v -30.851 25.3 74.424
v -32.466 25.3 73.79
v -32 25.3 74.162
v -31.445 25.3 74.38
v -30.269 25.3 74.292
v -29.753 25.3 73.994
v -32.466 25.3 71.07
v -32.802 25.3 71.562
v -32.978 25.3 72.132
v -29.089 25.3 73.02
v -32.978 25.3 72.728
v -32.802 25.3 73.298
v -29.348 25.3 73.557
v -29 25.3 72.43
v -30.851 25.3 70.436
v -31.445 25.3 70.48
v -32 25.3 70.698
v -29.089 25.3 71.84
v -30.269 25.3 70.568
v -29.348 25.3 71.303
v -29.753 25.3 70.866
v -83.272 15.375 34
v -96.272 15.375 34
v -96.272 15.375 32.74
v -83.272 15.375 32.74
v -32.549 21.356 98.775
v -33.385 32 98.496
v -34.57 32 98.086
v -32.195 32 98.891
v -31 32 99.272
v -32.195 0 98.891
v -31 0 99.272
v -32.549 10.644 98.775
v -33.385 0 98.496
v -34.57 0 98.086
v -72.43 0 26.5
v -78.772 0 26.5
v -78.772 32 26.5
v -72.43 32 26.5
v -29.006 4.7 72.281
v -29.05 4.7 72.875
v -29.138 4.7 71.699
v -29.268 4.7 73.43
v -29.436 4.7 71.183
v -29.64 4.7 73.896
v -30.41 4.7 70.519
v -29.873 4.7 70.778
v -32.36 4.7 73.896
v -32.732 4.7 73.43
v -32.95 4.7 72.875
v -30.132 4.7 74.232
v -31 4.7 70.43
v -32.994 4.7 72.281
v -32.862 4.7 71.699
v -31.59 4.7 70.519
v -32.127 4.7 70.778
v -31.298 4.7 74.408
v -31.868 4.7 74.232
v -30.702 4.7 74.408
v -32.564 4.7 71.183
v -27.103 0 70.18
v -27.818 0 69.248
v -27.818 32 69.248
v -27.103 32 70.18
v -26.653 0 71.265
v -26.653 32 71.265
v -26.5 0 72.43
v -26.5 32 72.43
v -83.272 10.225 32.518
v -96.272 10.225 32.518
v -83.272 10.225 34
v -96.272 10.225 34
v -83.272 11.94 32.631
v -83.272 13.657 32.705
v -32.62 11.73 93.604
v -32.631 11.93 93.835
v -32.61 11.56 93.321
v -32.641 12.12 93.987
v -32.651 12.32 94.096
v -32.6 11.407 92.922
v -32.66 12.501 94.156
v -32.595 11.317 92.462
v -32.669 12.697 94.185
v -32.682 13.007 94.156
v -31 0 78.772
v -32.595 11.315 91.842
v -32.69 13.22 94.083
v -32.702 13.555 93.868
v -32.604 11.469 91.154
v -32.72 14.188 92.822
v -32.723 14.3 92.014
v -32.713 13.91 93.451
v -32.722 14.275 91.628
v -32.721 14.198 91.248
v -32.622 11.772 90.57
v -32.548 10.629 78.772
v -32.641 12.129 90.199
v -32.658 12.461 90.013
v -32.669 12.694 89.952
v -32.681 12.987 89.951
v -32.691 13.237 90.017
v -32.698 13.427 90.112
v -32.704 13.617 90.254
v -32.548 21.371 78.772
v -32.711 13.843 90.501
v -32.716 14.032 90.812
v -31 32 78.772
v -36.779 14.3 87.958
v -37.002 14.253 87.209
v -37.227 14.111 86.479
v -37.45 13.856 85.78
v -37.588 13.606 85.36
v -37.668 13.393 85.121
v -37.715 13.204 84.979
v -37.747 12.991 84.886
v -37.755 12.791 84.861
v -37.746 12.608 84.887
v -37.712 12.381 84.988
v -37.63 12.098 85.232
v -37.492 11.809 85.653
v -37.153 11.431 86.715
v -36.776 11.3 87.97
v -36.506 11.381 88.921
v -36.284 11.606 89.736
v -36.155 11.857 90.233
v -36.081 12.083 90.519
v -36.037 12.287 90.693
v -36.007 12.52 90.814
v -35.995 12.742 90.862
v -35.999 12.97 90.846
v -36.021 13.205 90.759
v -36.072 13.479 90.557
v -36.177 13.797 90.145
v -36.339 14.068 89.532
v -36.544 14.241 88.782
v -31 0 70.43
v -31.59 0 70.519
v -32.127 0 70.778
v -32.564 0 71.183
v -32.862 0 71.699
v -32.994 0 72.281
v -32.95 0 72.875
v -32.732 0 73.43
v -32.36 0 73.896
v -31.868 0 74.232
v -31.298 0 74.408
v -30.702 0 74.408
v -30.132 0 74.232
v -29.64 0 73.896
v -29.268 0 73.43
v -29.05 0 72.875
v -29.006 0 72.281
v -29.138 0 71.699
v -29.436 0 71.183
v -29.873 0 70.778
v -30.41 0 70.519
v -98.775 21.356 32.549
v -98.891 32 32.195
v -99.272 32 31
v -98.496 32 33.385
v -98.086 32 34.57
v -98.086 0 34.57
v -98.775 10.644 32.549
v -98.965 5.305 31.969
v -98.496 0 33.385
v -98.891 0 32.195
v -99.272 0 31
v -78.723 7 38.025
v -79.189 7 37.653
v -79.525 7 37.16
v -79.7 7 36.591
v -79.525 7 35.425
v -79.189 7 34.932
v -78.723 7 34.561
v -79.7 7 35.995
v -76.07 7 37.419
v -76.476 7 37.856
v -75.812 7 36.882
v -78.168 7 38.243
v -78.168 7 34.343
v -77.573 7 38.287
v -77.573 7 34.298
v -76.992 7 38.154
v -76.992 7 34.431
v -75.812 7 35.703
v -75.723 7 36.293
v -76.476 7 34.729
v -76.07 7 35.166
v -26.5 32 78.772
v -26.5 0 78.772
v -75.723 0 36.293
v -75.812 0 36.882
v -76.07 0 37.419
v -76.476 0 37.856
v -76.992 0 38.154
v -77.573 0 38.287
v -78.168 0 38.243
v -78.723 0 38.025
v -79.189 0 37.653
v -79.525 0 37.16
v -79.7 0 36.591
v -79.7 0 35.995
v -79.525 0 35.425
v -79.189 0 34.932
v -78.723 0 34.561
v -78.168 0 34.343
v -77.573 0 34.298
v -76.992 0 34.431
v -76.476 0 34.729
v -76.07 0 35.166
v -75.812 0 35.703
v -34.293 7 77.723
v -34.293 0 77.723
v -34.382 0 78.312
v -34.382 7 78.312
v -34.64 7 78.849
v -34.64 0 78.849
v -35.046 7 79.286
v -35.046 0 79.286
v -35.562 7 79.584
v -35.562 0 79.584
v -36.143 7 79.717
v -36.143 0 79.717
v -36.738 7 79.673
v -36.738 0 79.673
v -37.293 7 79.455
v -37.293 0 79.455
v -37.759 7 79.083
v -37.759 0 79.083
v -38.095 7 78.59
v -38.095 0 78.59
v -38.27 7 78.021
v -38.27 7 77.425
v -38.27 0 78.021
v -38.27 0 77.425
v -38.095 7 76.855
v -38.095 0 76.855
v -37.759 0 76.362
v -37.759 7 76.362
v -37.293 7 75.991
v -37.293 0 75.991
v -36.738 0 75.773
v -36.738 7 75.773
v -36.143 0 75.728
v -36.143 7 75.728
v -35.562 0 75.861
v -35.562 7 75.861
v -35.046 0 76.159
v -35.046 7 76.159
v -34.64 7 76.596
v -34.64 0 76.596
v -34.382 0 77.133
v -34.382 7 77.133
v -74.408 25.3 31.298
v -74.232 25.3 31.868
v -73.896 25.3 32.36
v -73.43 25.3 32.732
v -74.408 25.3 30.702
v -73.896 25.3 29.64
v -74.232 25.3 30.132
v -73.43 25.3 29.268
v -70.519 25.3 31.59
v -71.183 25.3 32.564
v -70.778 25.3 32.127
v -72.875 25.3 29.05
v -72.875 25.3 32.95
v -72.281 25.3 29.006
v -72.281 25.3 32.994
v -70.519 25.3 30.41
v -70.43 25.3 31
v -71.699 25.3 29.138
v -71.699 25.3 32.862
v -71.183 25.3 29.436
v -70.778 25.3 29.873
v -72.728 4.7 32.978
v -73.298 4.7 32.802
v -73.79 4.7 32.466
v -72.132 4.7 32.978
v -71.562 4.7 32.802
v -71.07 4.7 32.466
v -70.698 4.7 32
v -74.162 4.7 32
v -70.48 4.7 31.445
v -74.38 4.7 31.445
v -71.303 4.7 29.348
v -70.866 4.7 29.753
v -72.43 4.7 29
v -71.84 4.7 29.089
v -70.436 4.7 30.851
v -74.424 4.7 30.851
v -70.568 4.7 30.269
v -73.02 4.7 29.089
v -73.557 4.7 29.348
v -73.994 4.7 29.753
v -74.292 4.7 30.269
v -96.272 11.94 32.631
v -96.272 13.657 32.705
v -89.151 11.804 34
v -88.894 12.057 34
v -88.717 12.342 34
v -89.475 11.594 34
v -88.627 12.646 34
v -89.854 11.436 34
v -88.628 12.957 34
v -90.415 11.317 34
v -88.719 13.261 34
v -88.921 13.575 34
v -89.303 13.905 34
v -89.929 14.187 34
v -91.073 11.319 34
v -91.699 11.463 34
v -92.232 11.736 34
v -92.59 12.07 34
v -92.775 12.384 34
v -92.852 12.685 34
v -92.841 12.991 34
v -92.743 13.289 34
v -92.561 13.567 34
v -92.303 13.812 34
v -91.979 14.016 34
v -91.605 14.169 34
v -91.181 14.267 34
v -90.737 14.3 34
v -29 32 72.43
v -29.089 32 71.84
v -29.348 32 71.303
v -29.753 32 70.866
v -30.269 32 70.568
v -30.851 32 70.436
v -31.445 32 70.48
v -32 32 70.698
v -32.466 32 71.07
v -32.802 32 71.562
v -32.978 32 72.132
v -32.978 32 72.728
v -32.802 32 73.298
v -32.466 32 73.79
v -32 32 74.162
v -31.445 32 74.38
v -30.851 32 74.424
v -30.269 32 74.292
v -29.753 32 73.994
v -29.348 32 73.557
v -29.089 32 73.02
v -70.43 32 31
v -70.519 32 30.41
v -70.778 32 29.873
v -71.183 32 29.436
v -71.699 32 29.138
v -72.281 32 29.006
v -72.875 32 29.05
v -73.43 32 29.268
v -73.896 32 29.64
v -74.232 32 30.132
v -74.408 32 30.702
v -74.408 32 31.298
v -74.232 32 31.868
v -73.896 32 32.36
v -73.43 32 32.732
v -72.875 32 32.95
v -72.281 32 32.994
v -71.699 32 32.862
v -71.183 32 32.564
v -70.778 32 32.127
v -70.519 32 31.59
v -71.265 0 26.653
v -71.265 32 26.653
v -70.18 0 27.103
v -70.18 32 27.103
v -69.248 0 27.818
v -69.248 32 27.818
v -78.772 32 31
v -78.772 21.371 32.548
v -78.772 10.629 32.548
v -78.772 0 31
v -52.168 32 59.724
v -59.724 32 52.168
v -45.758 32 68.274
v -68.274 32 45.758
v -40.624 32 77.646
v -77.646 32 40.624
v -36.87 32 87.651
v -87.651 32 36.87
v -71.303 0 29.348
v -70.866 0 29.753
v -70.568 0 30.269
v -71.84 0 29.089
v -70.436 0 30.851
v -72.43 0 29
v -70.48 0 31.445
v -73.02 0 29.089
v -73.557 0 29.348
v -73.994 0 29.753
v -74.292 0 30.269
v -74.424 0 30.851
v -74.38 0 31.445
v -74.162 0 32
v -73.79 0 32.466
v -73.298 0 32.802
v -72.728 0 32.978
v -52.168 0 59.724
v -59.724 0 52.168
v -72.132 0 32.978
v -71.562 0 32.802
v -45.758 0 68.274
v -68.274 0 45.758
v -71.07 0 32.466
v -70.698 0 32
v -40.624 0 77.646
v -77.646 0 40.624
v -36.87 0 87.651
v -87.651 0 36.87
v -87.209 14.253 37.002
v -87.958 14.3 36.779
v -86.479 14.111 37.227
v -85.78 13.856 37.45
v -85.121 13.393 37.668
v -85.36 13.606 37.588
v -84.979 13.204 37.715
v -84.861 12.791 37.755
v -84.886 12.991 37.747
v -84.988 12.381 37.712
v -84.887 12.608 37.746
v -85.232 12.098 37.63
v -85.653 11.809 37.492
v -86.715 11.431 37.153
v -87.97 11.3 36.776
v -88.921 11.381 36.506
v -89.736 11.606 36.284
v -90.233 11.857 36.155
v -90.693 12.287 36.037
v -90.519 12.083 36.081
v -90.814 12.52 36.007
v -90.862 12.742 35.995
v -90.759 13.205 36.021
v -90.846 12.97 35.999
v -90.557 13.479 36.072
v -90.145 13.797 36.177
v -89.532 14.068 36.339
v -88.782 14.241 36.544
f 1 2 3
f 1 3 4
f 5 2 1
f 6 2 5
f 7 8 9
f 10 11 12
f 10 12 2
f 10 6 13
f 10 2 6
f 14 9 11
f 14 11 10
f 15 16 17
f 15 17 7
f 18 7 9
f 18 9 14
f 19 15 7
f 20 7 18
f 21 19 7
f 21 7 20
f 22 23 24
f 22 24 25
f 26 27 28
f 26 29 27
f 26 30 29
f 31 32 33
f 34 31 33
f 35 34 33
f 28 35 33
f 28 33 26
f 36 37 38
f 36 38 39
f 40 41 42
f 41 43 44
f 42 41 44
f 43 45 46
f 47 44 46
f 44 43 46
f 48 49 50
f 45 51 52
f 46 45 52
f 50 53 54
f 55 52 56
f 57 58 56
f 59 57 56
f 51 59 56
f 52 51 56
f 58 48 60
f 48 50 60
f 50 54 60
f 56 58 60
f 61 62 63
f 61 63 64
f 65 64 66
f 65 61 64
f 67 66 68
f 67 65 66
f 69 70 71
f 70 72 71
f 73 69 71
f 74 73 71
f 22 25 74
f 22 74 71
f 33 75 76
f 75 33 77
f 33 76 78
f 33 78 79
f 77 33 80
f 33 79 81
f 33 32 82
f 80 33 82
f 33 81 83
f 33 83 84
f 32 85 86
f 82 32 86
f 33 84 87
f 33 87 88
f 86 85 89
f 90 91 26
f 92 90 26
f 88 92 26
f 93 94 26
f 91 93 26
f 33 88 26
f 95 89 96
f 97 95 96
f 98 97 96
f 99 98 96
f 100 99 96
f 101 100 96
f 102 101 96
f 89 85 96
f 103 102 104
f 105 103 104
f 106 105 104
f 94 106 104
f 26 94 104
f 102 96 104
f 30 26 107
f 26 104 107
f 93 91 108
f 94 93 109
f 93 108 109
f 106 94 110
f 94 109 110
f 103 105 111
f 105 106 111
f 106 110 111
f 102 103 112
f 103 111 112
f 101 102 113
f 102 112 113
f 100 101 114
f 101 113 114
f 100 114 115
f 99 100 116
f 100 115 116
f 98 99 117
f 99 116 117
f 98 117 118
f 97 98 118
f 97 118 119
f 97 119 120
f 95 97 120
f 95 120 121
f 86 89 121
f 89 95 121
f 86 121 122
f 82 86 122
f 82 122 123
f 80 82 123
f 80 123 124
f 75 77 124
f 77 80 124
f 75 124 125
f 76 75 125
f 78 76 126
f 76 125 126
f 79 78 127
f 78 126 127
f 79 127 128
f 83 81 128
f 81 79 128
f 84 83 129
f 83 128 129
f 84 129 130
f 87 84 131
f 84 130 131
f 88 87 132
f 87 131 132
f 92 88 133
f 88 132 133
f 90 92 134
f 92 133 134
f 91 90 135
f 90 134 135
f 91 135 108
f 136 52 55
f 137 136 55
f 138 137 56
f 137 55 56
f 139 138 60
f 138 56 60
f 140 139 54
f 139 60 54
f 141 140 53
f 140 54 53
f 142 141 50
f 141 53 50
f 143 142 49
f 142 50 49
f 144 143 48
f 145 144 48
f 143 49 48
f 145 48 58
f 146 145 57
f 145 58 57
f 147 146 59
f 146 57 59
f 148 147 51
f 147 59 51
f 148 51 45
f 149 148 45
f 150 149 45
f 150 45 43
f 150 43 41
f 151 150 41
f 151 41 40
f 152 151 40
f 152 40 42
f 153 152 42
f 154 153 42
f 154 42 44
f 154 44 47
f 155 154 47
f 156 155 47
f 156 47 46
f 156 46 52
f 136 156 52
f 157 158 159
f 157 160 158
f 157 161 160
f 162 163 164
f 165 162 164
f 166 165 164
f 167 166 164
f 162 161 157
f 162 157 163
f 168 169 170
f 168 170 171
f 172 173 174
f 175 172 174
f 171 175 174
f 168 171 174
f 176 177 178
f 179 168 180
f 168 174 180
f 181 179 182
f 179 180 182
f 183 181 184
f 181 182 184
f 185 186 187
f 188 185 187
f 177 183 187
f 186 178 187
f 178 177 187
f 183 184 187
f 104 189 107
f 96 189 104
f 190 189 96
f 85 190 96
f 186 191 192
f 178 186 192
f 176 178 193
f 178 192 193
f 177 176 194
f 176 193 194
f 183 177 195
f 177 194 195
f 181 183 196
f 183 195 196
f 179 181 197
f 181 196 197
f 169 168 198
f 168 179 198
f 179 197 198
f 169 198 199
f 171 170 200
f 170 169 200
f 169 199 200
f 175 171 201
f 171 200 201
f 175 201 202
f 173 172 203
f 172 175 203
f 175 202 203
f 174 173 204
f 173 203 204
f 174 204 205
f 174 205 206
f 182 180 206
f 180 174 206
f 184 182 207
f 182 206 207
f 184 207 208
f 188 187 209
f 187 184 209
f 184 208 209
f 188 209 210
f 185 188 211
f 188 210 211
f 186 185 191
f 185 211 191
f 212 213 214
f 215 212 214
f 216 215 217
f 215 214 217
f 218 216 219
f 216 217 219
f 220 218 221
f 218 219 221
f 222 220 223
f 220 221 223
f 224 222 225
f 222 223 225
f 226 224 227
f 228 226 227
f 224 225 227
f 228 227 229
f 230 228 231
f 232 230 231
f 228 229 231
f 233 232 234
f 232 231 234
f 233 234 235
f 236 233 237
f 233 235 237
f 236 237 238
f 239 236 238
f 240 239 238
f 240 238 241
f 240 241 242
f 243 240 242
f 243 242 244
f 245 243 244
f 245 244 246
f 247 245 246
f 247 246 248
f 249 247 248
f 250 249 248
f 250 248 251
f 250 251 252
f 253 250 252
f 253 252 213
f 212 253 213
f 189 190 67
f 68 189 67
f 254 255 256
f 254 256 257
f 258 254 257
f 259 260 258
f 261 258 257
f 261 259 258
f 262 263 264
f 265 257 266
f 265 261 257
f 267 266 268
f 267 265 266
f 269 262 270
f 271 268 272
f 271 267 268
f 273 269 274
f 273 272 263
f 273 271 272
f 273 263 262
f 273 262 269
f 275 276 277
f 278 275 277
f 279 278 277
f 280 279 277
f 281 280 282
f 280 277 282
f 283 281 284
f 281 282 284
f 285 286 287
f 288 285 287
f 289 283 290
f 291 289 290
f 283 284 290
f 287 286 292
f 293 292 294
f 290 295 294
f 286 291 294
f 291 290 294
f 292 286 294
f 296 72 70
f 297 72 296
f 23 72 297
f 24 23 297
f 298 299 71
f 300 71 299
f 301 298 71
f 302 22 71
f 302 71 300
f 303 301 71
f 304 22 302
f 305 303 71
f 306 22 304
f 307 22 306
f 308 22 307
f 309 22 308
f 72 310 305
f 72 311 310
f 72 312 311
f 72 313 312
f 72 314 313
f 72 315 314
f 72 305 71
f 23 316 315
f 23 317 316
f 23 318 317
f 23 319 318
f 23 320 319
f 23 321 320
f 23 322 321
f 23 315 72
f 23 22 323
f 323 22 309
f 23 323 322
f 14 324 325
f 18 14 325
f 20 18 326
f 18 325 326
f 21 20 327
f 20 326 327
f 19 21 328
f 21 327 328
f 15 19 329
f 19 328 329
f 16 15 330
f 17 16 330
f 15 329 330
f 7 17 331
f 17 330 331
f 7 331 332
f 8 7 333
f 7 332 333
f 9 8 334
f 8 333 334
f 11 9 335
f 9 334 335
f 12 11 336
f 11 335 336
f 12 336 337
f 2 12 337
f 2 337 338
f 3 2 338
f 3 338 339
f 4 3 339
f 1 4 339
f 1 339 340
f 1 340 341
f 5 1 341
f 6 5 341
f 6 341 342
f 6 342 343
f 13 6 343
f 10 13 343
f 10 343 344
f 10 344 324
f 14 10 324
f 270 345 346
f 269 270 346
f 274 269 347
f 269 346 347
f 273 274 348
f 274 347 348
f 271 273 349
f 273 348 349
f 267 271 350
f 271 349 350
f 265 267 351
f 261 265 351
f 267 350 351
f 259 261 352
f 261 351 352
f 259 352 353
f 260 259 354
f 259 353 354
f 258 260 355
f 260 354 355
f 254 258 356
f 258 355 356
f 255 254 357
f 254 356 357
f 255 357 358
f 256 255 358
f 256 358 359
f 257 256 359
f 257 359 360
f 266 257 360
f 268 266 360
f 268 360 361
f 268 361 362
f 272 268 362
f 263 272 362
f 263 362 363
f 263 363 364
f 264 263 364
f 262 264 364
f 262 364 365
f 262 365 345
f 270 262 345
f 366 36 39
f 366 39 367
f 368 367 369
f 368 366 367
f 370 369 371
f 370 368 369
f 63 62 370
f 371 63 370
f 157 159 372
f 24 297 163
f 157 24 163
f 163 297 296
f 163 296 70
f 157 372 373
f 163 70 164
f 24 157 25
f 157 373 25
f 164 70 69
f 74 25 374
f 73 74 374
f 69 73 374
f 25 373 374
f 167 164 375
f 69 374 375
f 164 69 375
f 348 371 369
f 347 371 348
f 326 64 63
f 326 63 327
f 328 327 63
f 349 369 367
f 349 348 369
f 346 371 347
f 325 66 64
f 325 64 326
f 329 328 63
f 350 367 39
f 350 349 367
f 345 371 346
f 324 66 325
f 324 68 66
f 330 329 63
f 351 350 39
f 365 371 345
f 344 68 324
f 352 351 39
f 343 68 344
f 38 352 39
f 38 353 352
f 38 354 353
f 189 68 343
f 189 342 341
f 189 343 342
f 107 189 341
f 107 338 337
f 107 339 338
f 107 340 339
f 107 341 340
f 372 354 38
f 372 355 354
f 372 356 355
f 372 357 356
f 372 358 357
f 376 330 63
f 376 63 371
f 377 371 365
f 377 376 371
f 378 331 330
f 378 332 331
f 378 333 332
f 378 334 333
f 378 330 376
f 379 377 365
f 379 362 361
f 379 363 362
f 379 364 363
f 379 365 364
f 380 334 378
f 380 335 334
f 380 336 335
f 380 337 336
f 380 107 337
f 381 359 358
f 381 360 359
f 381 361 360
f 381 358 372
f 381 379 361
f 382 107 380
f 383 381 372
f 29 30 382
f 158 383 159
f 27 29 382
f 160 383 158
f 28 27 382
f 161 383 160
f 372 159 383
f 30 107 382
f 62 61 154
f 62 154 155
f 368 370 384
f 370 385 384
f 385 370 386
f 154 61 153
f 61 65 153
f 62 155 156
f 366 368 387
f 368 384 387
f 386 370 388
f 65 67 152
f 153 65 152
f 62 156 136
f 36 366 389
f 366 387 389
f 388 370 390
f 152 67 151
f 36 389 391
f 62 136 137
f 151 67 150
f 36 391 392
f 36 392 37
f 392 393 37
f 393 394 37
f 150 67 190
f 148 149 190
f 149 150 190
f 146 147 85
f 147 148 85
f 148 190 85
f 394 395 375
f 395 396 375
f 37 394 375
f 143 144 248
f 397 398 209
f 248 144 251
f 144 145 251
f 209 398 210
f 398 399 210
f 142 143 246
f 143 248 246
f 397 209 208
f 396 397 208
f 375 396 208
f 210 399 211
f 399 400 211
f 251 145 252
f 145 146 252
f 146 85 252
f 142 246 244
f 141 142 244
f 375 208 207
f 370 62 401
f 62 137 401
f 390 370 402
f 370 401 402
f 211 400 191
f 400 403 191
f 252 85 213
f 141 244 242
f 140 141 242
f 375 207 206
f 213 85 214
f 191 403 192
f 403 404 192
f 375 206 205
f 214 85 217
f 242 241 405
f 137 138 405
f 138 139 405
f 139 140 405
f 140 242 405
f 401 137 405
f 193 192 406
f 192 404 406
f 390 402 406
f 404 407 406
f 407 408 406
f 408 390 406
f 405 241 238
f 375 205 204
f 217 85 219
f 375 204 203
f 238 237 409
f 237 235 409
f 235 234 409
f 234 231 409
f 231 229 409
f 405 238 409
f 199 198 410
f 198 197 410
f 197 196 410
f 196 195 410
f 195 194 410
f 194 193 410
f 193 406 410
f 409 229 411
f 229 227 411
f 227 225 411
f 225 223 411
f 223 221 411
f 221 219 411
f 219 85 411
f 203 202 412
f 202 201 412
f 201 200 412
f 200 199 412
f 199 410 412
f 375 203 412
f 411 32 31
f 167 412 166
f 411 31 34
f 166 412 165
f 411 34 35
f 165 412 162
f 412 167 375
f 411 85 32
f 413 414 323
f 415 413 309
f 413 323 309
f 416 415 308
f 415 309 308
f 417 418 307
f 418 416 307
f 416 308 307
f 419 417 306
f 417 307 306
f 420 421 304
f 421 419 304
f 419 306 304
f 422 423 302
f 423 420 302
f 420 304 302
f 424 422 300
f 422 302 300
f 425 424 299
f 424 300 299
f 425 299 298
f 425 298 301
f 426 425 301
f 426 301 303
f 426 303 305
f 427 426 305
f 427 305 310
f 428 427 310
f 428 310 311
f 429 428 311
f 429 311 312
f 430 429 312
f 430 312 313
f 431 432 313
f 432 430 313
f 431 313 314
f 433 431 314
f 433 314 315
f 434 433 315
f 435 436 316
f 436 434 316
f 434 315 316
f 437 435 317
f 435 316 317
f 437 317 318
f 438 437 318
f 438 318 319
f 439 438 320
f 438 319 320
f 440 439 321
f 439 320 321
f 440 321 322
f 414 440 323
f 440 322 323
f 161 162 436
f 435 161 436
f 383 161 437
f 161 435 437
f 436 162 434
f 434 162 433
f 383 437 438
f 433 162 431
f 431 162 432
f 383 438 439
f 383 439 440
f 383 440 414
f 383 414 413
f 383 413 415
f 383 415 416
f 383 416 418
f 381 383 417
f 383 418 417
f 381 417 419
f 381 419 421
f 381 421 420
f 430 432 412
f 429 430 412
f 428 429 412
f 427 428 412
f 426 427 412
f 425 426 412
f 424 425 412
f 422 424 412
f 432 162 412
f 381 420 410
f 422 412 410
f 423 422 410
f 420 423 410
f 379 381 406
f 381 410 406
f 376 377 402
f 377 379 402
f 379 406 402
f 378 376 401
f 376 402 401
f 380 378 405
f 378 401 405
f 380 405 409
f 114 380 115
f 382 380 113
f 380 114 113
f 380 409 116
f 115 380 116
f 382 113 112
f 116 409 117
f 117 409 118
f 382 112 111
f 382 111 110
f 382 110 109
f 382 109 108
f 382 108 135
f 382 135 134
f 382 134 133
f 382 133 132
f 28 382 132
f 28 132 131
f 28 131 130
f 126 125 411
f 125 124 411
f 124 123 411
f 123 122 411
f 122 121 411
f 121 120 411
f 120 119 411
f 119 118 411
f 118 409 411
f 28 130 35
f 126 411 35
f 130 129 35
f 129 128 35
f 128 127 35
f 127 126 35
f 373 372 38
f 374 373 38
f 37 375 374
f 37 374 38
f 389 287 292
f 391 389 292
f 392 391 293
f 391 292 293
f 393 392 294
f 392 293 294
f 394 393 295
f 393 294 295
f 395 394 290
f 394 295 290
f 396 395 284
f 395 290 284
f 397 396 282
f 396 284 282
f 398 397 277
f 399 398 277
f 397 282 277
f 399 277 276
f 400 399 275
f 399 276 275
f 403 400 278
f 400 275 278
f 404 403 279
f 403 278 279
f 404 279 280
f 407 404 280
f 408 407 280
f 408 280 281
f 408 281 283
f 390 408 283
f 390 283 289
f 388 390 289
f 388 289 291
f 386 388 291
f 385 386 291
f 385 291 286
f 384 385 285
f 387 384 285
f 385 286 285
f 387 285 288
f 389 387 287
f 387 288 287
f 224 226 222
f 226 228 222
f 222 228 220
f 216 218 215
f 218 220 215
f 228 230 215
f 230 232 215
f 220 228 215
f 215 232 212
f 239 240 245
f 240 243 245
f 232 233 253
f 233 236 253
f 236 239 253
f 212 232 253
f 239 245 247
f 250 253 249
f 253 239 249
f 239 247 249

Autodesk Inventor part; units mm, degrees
ref_plane "YZ Plane" through (0, 0, 0) normal (1, 0, 0) x (0, 1, 0)
ref_plane "XZ Plane" through (0, 0, 0) normal (0, 1, 0) x (-1, 0, 0)
ref_plane "XY Plane" through (0, 0, 0) normal (0, 0, 1) x (1, 0, 0)
sketch "Эскиз1" plane through (0, 0, 0) normal (0, 1, 0) x (-1, 0, 0)
  circle A0 centre (-44.87, 82.9015) radius 1.5
  line L0 (-31, 99.2724) -> (-31, 78.7724)
  line L1 (-31, 78.7724) -> (31, 78.7724)
  circle A1 centre (-42.22, 16) radius 1.5
  circle A2 centre (-16, 42.22) radius 1.5
  circle A3 centre (16, 42.22) radius 1.5
  circle A4 centre (31, 72.43) radius 1.5
  circle A5 centre (16, 72.43) radius 1.5
  circle A6 centre (-16, 72.43) radius 1.5
  arc A7 (-31, 99.2724) -> (-99.2724, 31) centre (0, 0) ccw
  circle A8 centre (-74.5664, 57.67) radius 1.5
  circle A9 centre (-82.9015, 44.87) radius 1.5
  circle A10 centre (-72.43, -16) radius 1.5
  circle A11 centre (-72.43, 16) radius 1.5
  line L2 (-78.7724, 31) -> (-78.7724, -31)
  line L3 (-99.2724, 31) -> (-78.7724, 31)
  line L4 (31, 78.7724) -> (31, 99.2724)
  arc A12 (34.57, 98.0863) -> (98.0863, 34.57) centre (109.0212, 109.0212) ccw
  circle A13 centre (72.43, 31) radius 1.5
  line L5 (99.2724, 31) -> (78.7724, 31)
  circle A14 centre (72.43, 16) radius 1.5
  arc A15 (34.57, 98.0863) -> (31, 99.2724) centre (0, 0) ccw
  arc A16 (99.2724, 31) -> (98.0863, 34.57) centre (0, 0) ccw
  arc A17 (98.0863, 34.57) -> (34.57, 98.0863) centre (0, 0) ccw
  circle A18 centre (42.22, 16) radius 1.5
  circle A19 centre (82.9015, -44.87) radius 1.5
  line L6 (78.7724, -31) -> (99.2724, -31)
  arc A20 (31, -99.2724) -> (99.2724, -31) centre (0, 0) ccw
  circle A21 centre (16, -72.43) radius 1.5
  line L7 (31, -78.7724) -> (31, -99.2724)
  circle A22 centre (44.87, -82.9015) radius 1.5
  circle A23 centre (57.67, -74.5664) radius 1.5
  circle A24 centre (-57.67, 74.5664) radius 1.5
  circle A25 centre (-42.22, -16) radius 1.5
  circle A26 centre (42.22, -16) radius 1.5
  circle A27 centre (-72.43, -31) radius 1.5
  line L8 (-73.5391, 73.5391) -> (73.5391, -73.5391) construction
  line L9 (78.7724, 31) -> (78.7724, -31)
  circle A28 centre (72.43, -16) radius 1.5
  circle A29 centre (-16, -42.22) radius 1.5
  circle A30 centre (16, -42.22) radius 1.5
  circle A31 centre (74.5664, -57.67) radius 1.5
  line L10 (-31, -78.7724) -> (31, -78.7724)
  circle A32 centre (-16, -72.43) radius 1.5
  circle A33 centre (-31, -72.43) radius 1.5
  line L11 (-31, -99.2724) -> (-31, -78.7724)
  arc A34 (-34.57, -98.0863) -> (-31, -99.2724) centre (0, 0) ccw
  line L12 (-78.7724, -31) -> (-99.2724, -31)
  arc A35 (-99.2724, -31) -> (-98.0863, -34.57) centre (0, 0) ccw
  arc A36 (-98.0863, -34.57) -> (-34.57, -98.0863) centre (0, 0) ccw
  arc A37 (-34.57, -98.0863) -> (-98.0863, -34.57) centre (-109.0212, -109.0212) ccw
sketch "Эскиз2" plane through (0, 0, 0) normal (0, 1, 0) x (-1, 0, 0)
  arc A0 (34.57, 98.0863) -> (98.0863, 34.57) centre (109.0212, 109.0212) ccw projected
  arc A1 (99.2724, 31) -> (98.0863, 34.57) centre (0, 0) ccw projected
  arc A2 (34.57, 98.0863) -> (31, 99.2724) centre (0, 0) ccw projected
  line L0 (31, 78.7724) -> (31, 99.2724) projected
  circle A3 centre (31, 72.43) radius 1.5 projected
  circle A4 centre (72.43, 31) radius 1.5 projected
  circle A5 centre (31, 72.43) radius 4.5
  circle A6 centre (72.43, 31) radius 4.5
  line L1 (27.818, 69.248) -> (69.248, 27.818)
  line L2 (26.5, 78.7724) -> (26.5, 72.43)
  line L3 (78.7724, 31) -> (78.7724, -31) projected
  line L4 (78.7724, 26.5) -> (72.43, 26.5)
  line L5 (99.2724, 31) -> (78.7724, 31) projected
  line L6 (26.5, 78.7724) -> (31, 78.7724)
  dimension "d0" = 9
  dimension "d1" = 9
extrude "Выдавливание1" add sketch "Эскиз2" along normal blind 32
ref_plane "РабПлоскость1" through (0, 25.3, 0) normal (0, 1, 0) x (1, 0, 0)
sketch "Эскиз3" plane through (0, 25.3, 0) normal (0, 1, 0) x (1, 0, 0)
  circle A0 centre (-72.43, -31) radius 1.5 projected
  circle A1 centre (-31, -72.43) radius 1.5 projected
  point P0 (0, 0)
extrude "Выдавливание2" add sketch "Эскиз3" against normal blind 20.6
sketch "Эскиз4" plane through (-31, 0, 78.7724) normal (0, 0, 1) x (1, 0, 0)
  line L0 (0, 1) -> (0, 32)
  line L1 (0, 32) -> (-3.57, 32) projected
  line L2 (0, 0) -> (0, 32) projected
  arc A0 (0, 32) -> (0, 0) centre (72.5929, 16) ccw
  point P0 (31, 0)
extrude "Выдавливание3" cut sketch "Эскиз4" along normal through all
ref_plane "РабПлоскость2" through (-48.533, 0, 48.533) normal (0.7071, 0, 0.7071) x (0, 1, 0)
mirror "Зеркальное отражение1" about plane through (-48.533, 0, 48.533) normal (0.7071, 0, 0.7071) of "Выдавливание3"
sketch "Эскиз6" plane through (0, 0, 0) normal (0, 1, 0) x (1, 0, 0)
  circle A0 centre (124.1994, 64.0459) radius 3
  circle A1 centre (-31, -72.43) radius 1.5 projected
  circle A2 centre (-72.43, -31) radius 1.5 projected
  line L0 (-72.43, -31) -> (-31, -72.43)
  line L1 (-31, -72.43) -> (-36.2927, -77.7227)
  circle A3 centre (-36.2927, -77.7227) radius 2
  line L2 (164.6688, 164.6688) -> (-154.6363, -154.6363) projected
  circle A4 centre (-77.7227, -36.2927) radius 2
  point P0 (0, 0)
  point P1 (129.0863, 44.2024)
  dimension "d12" = 6
  dimension "d13" = 7.485
  dimension "d14" = 4
extrude "Выдавливание5" cut sketch "Эскиз6" along normal blind 7 contours A3 | A4
ref_plane "РабПлоскость4" through (0, 12.8, 0) normal (0, -1, 0) x (1, 0, 0)
sketch "Эскиз9" plane through (0, 12.8, 0) normal (0, -1, 0) x (1, 0, 0)
  line L0 (-83.2724, 34) -> (-96.2724, 34)
  line L1 (-96.2724, 34) -> (-96.2724, 31)
  line L2 (-96.2724, 31) -> (-83.2724, 31)
  line L3 (-83.2724, 31) -> (-83.2724, 34)
  line L4 (-99.2724, 31) -> (-78.7724, 31)
  point P0 (0, 0)
  point P1 (0, 0)
  dimension "d23" = 3
  dimension "d24" = 13
  dimension "d43" = 3
extrude "Выдавливание6" cut sketch "Эскиз9" along normal mid plane 5.15
sketch "Эскиз10" plane through (-48.533, 0, 48.533) normal (0.7071, 0, 0.7071) x (0, 1, 0)
  line L0 (15.375, 14.288) -> (10.225, 14.288) projected
  line L1 (12.8, 14.288) -> (12.8, 27.3139)
  circle A0 centre (12.8, 19.5665) radius 1.5
  line L2 (0, 5.8027) -> (32, 5.8027) projected
  point P0 (0, -68.6361)
  dimension "d29" = 3
  dimension "d31" = 13.7638
extrude "Выдавливание7" cut sketch "Эскиз10" along normal mid plane 100
hole "Отверстие1" at (-72.43, 0, 31) at (-31, 0, 72.43) direction (0, 1, 0) diameter 4 depth 4.7
sketch "Эскиз11" plane through (0, 32, 0) normal (0, 1, 0) x (1, 0, 0)
  circle A0 centre (-72.43, -31) radius 1.5 projected
  circle A1 centre (-31, -72.43) radius 1.5 projected
  circle A2 centre (-72.43, -31) radius 2 projected
  circle A3 centre (-31, -72.43) radius 2 projected
  point P0 (0, 0)
extrude "Выдавливание8" cut sketch "Эскиз11" against normal up to surface (6.7 mm away) contours A0 | A1 | A2 | A3
equation "\"d1\" = d0"
properties part number "сфеср"
